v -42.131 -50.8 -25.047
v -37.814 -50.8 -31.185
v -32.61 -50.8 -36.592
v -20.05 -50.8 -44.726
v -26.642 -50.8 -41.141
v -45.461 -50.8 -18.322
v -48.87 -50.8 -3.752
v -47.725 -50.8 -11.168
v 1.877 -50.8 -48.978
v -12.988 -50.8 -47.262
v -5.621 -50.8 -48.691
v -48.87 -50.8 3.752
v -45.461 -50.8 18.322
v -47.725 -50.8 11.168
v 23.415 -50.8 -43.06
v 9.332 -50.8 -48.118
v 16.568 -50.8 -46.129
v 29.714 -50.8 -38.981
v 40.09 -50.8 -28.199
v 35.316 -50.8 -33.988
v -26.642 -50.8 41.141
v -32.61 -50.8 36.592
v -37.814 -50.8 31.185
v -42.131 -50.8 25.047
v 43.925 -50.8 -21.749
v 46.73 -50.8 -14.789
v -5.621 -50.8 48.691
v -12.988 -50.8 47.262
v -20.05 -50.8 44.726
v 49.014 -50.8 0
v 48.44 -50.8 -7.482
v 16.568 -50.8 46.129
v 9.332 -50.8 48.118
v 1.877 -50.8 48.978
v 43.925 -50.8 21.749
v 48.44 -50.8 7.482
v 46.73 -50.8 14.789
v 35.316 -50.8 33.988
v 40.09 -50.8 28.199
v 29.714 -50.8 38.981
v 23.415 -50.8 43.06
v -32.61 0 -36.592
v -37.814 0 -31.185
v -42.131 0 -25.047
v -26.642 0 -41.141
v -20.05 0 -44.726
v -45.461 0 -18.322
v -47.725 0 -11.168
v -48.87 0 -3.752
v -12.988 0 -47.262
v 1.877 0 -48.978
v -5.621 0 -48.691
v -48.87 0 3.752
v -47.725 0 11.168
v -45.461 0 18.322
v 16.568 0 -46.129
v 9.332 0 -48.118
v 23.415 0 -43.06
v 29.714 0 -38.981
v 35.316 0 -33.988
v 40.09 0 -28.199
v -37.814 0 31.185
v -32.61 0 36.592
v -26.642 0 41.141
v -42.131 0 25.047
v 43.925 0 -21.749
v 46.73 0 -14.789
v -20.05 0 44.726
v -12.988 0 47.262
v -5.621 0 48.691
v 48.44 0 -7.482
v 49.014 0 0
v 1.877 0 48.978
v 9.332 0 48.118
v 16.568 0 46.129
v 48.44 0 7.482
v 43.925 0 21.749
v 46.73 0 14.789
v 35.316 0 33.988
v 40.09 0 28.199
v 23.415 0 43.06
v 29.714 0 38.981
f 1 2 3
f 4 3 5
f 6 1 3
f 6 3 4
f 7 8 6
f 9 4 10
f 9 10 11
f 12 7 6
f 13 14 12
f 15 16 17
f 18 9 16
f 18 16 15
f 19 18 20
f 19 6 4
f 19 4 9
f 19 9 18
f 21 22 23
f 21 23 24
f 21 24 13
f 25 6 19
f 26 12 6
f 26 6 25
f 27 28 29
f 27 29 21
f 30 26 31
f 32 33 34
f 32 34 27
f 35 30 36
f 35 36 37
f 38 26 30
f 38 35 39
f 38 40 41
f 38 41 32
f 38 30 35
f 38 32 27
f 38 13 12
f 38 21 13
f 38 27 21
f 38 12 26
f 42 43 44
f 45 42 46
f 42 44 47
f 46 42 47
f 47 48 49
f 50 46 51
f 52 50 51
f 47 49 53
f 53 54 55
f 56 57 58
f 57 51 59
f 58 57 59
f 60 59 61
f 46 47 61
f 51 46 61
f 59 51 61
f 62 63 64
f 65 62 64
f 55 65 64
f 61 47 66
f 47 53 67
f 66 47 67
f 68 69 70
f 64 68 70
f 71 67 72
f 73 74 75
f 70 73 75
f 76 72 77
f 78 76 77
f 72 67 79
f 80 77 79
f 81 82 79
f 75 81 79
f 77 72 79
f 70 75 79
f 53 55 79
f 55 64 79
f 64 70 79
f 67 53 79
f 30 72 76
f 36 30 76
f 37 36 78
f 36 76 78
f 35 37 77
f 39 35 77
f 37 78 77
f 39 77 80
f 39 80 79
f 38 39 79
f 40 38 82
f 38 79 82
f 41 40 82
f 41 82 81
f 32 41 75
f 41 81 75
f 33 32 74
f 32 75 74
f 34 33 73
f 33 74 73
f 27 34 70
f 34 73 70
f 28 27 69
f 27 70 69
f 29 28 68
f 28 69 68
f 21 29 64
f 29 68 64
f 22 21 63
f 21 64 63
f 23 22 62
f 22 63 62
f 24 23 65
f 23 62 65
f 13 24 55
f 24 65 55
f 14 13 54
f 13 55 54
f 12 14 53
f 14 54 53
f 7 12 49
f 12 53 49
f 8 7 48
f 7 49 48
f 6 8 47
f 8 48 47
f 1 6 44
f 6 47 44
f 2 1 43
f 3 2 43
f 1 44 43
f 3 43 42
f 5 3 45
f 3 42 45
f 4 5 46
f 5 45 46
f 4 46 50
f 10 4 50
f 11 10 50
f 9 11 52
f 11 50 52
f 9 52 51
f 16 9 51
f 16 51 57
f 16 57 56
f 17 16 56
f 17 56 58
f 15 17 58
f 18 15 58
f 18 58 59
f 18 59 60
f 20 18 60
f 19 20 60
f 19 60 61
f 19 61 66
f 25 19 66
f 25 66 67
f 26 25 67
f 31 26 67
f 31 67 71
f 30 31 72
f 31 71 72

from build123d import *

# Parameters (mm, degrees)
F0_R     = 128.8146505864
F1_DEPTH = 25.4
F3_R     = 49.0141215923
F4_DEPTH = 50.8


# Not quite as in the source:
# - the program builds the solid bodies; features that only make, move or delete a surface that nothing else refers to are left out


with BuildPart() as f1:
    # F0 (on Front) → F1 (new body)
    with BuildSketch(Plane.XZ):
        with Locations((10.3380498641, 23.791786507)):
            Circle(F0_R)
        with BuildLine():
            ThreePointArc((48.5750728322, 28.0582736708), (55.5999914747, 14.8036448721), (58.026257129, 0))
            ThreePointArc((58.026257129, 0), (42.1859059552, -34.9036707218), (5.4861297438, -45.9630279004))
            ThreePointArc((5.4861297438, -45.9630279004), (-66.466433543, -36.001514495), (-48.743487455, 34.4420820545))
            ThreePointArc((-48.743487455, 34.4420820545), (0.9542816207, 81.3053730097), (48.7808239875, 32.5338840485))
            ThreePointArc((48.7808239875, 32.5338840485), (48.7293590503, 30.2937154281), (48.5750728322, 28.0582736708))
        make_face(mode=Mode.SUBTRACT)
    extrude(amount=F1_DEPTH)


with BuildPart() as f4:
    # F3 (on Front) → F4 (new body)
    with BuildSketch(Plane.XZ):
        Circle(F3_R)
    extrude(amount=F4_DEPTH)


solid = f4.part
